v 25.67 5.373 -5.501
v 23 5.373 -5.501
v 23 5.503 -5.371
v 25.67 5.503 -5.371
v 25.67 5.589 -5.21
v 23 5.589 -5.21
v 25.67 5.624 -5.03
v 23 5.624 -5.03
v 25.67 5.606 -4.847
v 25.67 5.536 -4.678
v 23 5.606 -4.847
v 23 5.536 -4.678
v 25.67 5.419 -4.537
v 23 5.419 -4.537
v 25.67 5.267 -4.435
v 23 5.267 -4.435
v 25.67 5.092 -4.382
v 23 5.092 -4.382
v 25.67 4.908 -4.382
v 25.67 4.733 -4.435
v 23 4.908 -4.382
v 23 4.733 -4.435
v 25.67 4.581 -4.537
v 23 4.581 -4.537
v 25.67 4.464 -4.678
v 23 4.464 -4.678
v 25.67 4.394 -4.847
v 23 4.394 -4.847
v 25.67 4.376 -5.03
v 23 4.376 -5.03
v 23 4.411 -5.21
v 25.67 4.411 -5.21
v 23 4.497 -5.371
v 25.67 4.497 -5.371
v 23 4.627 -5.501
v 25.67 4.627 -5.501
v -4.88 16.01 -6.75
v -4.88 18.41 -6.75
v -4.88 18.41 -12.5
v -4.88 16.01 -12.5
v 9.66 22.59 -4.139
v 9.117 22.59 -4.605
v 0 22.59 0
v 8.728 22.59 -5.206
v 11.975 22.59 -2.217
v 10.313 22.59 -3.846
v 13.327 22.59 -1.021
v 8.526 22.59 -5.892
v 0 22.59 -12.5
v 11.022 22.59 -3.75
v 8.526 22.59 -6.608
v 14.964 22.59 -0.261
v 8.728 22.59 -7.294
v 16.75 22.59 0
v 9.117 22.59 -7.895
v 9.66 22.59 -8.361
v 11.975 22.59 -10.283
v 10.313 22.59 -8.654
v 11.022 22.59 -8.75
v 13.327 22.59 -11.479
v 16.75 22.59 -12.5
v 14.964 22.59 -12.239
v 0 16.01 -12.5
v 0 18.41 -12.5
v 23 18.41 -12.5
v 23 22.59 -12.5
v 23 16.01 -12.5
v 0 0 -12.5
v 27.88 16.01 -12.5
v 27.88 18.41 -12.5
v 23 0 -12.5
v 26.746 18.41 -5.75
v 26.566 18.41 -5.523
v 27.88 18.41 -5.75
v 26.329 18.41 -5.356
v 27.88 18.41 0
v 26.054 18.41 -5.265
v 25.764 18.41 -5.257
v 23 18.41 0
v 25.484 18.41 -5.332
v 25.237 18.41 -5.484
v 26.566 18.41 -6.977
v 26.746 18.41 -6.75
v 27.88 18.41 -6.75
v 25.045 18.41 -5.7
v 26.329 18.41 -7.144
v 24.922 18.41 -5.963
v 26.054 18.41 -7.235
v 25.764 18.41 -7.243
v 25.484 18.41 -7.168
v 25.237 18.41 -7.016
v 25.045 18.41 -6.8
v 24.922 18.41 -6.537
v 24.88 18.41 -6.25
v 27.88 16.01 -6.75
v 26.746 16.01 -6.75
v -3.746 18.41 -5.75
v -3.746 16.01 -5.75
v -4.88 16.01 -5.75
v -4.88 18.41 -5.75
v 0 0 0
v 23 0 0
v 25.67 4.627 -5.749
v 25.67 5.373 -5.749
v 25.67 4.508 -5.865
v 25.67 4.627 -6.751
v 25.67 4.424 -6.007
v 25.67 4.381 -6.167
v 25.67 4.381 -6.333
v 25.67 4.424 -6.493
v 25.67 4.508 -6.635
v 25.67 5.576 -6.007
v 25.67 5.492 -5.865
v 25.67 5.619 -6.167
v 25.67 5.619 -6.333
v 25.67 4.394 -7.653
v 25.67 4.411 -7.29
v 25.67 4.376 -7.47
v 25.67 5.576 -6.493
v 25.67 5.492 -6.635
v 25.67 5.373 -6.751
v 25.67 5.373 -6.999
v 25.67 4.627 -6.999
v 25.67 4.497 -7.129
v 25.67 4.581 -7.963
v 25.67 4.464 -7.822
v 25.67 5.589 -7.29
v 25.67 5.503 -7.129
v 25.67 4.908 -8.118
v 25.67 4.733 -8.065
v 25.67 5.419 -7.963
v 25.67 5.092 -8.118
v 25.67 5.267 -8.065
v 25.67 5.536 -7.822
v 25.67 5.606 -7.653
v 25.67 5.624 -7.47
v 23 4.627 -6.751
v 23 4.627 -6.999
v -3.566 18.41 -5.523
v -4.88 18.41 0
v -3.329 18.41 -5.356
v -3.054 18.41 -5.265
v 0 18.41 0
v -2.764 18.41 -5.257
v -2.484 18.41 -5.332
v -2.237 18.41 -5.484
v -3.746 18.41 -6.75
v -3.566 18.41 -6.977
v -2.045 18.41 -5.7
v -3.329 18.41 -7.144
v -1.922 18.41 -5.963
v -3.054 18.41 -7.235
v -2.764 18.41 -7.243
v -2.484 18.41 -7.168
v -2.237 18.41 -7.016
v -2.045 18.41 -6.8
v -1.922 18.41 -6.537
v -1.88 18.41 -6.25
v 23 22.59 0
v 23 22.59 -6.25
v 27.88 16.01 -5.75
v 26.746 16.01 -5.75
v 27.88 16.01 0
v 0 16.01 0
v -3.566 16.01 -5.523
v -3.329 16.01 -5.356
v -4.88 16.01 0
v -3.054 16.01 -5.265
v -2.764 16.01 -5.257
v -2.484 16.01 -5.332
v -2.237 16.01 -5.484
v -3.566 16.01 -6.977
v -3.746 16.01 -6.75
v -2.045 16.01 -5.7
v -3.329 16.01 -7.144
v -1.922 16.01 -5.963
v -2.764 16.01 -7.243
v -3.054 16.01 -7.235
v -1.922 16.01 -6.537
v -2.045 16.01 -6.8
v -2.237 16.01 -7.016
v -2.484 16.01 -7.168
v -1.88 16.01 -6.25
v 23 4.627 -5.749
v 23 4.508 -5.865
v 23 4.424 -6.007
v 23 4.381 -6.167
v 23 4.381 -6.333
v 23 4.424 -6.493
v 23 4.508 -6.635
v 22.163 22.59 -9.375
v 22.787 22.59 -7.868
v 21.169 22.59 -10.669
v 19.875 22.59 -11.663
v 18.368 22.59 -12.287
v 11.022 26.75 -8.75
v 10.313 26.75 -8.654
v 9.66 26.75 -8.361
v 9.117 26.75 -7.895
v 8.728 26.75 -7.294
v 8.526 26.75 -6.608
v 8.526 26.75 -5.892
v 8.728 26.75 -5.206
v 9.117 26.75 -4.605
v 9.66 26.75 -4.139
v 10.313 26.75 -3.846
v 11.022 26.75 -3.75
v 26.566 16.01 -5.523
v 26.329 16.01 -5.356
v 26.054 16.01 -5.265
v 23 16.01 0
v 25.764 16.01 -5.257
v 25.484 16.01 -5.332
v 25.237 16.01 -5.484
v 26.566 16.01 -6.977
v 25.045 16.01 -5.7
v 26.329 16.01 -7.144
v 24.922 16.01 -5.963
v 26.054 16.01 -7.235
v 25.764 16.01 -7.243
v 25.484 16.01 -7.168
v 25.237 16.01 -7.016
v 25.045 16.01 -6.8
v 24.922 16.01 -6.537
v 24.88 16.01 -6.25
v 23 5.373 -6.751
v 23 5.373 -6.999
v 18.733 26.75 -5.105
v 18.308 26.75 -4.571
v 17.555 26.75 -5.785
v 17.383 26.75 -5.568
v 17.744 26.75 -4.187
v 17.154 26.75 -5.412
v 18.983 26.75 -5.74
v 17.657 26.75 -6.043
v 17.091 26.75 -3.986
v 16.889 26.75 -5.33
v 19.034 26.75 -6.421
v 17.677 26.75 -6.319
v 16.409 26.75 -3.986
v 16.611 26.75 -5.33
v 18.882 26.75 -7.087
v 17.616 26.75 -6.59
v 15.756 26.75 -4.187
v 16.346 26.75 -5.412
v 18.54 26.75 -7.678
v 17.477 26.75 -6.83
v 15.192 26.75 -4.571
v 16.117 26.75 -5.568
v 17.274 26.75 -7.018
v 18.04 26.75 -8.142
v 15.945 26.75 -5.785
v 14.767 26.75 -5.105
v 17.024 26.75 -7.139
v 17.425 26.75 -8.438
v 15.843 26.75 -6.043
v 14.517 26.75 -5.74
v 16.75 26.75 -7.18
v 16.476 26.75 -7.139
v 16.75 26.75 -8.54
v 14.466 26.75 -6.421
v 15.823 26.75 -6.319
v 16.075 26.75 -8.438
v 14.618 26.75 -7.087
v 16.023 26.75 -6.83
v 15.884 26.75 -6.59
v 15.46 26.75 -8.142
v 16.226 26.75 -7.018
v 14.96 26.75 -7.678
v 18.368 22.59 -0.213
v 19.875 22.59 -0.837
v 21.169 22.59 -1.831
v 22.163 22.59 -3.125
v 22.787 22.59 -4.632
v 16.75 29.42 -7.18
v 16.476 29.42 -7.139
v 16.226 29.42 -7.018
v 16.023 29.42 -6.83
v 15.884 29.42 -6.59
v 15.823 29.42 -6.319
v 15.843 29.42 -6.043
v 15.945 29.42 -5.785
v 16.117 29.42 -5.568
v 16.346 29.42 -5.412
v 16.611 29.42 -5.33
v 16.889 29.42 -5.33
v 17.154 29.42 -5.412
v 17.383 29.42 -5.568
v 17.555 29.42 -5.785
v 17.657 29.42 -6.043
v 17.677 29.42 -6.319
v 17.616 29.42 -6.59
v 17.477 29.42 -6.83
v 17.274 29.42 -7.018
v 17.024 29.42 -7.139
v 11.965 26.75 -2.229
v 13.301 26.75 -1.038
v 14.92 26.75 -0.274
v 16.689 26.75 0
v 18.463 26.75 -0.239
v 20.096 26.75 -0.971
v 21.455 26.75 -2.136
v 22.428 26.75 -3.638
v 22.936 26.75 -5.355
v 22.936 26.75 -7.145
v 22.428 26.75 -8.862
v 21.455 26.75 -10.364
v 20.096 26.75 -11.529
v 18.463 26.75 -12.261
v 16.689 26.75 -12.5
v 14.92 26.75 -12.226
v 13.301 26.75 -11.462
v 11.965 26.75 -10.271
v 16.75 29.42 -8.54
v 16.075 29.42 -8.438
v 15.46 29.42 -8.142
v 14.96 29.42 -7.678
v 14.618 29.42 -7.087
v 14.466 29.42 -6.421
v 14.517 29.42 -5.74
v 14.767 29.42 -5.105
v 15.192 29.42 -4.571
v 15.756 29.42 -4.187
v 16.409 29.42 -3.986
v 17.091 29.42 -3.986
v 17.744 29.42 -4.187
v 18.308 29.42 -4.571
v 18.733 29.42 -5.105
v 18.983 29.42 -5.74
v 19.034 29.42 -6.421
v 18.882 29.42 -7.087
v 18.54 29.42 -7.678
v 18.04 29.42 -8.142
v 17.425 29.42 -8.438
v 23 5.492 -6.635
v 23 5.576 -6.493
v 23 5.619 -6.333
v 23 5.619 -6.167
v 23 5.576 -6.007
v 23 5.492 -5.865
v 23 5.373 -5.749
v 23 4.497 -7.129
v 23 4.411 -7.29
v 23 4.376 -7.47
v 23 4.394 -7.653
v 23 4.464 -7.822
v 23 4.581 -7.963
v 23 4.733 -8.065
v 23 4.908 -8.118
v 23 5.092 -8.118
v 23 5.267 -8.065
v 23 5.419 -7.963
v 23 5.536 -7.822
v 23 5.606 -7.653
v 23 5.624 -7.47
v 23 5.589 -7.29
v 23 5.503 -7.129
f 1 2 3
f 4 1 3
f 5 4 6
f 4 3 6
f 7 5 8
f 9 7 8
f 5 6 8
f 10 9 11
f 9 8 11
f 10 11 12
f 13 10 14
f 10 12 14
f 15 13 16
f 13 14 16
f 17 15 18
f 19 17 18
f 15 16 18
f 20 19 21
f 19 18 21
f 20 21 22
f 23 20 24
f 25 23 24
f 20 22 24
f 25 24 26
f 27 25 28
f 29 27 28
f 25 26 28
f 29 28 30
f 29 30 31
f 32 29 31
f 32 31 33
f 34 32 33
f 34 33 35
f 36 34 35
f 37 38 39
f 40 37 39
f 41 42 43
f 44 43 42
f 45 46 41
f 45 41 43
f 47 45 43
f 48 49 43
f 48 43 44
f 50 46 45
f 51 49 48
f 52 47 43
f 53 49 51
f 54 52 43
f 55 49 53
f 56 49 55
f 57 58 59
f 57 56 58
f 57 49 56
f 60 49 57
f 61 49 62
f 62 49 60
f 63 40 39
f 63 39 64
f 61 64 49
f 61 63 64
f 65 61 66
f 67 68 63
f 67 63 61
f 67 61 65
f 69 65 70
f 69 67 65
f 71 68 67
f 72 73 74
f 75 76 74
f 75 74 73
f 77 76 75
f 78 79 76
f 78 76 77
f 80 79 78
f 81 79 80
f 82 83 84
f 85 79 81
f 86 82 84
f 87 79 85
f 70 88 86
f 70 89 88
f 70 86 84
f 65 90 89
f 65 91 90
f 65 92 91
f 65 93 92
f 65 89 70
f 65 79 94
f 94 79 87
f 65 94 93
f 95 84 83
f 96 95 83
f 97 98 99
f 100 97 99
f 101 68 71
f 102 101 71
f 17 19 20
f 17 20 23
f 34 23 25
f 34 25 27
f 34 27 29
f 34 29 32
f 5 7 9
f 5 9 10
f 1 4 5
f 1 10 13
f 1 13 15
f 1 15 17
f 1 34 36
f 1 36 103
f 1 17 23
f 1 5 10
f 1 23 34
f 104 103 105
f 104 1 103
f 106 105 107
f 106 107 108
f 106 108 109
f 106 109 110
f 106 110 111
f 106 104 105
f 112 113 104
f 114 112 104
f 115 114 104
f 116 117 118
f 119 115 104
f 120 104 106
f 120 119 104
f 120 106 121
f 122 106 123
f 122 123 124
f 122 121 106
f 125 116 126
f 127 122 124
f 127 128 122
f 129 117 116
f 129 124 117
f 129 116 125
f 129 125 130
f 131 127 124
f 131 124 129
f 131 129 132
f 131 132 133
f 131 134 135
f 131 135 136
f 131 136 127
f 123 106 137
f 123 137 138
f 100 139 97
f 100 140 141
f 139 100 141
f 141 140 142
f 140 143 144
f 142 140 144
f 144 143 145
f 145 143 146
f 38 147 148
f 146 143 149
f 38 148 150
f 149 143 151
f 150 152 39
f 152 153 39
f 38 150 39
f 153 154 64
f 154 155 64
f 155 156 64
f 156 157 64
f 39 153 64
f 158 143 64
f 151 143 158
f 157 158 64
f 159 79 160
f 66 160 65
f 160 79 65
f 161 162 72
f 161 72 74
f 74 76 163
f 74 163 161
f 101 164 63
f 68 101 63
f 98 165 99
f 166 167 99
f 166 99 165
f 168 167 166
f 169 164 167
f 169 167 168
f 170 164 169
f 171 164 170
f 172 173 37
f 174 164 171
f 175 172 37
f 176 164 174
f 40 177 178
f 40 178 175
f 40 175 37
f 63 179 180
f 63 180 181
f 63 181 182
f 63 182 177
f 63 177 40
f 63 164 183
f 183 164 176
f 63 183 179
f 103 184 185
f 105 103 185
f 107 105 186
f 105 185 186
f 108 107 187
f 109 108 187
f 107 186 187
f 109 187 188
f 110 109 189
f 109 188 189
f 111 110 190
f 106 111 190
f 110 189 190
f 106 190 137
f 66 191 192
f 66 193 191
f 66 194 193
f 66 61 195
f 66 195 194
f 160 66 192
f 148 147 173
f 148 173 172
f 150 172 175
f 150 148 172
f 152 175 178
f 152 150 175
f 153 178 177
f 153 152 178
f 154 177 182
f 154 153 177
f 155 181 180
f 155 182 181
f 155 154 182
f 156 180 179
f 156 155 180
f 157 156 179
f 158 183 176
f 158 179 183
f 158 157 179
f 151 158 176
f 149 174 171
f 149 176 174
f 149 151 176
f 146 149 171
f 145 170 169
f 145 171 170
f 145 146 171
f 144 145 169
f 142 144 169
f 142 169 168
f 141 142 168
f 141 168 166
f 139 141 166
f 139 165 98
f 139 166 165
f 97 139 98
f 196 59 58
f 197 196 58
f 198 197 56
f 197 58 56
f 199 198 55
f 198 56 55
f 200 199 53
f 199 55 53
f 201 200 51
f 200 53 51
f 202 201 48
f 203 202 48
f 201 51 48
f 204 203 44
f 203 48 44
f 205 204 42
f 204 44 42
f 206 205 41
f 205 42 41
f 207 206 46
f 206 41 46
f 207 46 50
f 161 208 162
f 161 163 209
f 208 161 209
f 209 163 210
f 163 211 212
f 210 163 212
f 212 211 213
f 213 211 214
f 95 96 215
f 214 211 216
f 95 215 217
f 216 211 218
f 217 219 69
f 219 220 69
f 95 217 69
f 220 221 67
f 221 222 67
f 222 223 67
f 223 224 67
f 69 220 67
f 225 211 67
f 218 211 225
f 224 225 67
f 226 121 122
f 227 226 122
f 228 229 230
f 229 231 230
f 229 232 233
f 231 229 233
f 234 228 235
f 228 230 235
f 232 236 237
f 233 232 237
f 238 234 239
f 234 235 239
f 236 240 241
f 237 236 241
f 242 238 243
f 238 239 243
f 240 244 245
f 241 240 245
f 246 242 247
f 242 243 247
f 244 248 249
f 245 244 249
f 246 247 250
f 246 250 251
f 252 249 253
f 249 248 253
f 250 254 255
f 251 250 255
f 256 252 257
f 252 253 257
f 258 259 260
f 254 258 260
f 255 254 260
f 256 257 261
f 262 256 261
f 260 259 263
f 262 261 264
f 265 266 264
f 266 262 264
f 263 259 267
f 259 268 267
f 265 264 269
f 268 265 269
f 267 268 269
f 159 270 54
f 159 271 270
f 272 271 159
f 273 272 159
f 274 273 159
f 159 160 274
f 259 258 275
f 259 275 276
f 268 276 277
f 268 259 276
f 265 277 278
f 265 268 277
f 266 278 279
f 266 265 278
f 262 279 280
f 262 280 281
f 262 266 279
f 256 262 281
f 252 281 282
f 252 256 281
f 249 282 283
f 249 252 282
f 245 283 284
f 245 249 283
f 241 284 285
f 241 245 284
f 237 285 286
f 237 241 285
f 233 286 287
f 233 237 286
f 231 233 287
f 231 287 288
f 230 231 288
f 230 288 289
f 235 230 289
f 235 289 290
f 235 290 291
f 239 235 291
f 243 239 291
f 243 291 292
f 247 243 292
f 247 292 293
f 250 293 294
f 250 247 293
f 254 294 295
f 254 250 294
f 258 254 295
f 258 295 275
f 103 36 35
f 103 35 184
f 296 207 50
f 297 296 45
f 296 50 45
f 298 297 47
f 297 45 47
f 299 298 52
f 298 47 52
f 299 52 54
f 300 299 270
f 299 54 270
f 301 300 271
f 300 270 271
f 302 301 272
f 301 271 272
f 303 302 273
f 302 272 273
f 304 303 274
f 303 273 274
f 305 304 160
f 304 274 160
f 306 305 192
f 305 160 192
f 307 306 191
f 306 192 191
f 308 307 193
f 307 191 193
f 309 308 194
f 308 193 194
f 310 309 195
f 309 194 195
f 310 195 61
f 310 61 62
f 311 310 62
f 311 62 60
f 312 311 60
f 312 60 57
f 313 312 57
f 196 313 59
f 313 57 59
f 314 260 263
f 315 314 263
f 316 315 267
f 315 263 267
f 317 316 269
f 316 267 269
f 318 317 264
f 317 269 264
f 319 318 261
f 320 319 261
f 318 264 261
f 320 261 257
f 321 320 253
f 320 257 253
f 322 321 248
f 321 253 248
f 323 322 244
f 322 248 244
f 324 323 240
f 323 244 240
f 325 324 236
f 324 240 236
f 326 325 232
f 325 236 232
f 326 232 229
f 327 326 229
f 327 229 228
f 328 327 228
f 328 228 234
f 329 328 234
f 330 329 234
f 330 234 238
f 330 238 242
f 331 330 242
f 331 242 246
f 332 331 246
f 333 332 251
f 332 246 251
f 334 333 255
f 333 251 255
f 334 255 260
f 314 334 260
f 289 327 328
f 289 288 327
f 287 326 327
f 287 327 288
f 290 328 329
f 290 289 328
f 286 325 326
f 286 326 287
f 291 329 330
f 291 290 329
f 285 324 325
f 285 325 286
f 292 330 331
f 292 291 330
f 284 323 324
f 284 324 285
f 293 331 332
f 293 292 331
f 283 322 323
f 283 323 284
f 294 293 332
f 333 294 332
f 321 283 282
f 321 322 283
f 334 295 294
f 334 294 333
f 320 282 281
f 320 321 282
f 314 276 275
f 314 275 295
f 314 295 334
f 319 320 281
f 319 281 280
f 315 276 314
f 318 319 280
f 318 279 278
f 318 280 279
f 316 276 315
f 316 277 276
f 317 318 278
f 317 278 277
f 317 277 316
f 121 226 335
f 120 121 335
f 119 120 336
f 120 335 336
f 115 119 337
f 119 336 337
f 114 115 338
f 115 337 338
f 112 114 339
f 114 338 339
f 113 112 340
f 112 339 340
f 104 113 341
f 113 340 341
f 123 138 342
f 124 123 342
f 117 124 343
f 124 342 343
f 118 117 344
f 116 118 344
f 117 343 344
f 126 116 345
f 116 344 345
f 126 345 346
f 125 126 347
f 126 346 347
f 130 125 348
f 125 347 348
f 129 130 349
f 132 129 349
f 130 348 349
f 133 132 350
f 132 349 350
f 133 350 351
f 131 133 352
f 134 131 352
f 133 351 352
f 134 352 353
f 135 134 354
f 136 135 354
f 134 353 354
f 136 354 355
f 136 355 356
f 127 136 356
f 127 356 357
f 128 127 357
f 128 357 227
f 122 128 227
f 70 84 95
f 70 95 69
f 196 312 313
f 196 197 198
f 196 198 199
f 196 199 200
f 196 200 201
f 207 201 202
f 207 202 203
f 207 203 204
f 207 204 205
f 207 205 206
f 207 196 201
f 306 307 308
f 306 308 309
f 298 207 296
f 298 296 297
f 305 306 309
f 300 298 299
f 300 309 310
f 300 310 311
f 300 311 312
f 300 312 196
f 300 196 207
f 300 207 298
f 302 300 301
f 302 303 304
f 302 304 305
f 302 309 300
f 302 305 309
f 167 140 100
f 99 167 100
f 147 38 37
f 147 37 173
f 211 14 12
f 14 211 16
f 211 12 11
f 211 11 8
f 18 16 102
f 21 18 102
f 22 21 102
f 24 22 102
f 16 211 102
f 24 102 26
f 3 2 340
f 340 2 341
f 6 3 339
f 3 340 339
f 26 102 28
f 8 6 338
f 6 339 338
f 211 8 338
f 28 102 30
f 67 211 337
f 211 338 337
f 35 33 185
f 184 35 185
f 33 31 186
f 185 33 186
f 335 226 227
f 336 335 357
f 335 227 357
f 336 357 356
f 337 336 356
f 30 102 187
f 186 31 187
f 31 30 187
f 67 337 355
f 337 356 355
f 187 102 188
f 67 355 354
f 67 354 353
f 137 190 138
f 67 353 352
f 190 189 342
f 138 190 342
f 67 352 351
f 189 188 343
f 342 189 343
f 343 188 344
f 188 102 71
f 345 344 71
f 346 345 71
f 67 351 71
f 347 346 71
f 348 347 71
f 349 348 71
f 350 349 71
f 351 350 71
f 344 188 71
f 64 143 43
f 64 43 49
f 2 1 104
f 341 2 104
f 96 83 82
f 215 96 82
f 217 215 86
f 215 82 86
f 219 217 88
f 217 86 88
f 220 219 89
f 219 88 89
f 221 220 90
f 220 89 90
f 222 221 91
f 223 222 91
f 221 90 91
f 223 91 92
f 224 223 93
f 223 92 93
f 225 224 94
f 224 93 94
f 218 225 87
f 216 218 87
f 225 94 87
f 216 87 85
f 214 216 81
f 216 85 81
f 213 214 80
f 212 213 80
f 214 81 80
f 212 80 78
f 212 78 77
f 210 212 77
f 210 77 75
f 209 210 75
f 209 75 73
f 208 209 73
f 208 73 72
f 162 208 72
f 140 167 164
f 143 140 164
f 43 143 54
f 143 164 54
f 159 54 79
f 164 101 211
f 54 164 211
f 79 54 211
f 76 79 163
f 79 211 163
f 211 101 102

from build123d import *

# Parameters (mm, degrees)
SKETCH1_W           = 23
SKETCH1_H           = 12.5
BOSS_EXTRUDE1_DEPTH = 22.59
SKETCH2_R           = 6.25
BOSS_EXTRUDE2_DEPTH = 4.16
SKETCH3_R           = 2.5
BOSS_EXTRUDE3_DEPTH = 4.16
SKETCH6_R           = 2.29
SKETCH6_R_2         = 0.93
BOSS_EXTRUDE5_DEPTH = 2.67
SKETCH4_W           = 12.5
SKETCH4_H           = 2.4
BOSS_EXTRUDE4_DEPTH = 4.88
CUT_EXTRUDE1_DEPTH  = 36.671732506
SKETCH7_R           = 0.625
SKETCH7_W           = 1.497675386
SKETCH7_H           = 0.746890466
BOSS_EXTRUDE7_DEPTH = 2.67


with BuildPart() as part:
    # Sketch1 → Boss-Extrude1 (new body)
    with BuildSketch(Plane(origin=(0, 0, 0), x_dir=(1, 0, 0), z_dir=(0, 1, 0))):
        with Locations((11.5, 6.25)):
            Rectangle(SKETCH1_W, SKETCH1_H)
    extrude(amount=BOSS_EXTRUDE1_DEPTH)

    # Sketch2 → Boss-Extrude2 (add)
    with BuildSketch(Plane(origin=(0, 22.59, 0), x_dir=(1, 0, 0), z_dir=(0, 1, 0))):
        with Locations(Location((16.75, 6.25, 0), (0, 0, 270))):
            Circle(SKETCH2_R)
    extrude(amount=BOSS_EXTRUDE2_DEPTH)

    # Sketch3 → Boss-Extrude3 (add)
    with BuildSketch(Plane(origin=(0, 22.59, 0), x_dir=(1, 0, 0), z_dir=(0, 1, 0))):
        with Locations((11, 6.25)):
            Circle(SKETCH3_R)
    extrude(amount=BOSS_EXTRUDE3_DEPTH)

    # Sketch4 → Boss-Extrude4 (add)
    with BuildSketch(Plane(origin=(23, 0, 0), x_dir=(0, 0, -1), z_dir=(1, 0, 0))):
        with Locations((6.25, 17.21)):
            Rectangle(SKETCH4_W, SKETCH4_H)
    boss_extrude4 = extrude(amount=BOSS_EXTRUDE4_DEPTH)

    # Sketch5 → Cut-Extrude1 (cut, through all)
    with BuildSketch(Plane(origin=(0, 18.41, 0), x_dir=(1, 0, 0), z_dir=(0, 1, 0))):
        with BuildLine():
            Line((25.88, 5.75), (25.88, 6.75))
            Line((25.88, 6.75), (26.746025404, 6.75))
            ThreePointArc((26.746025404, 6.75), (24.88, 6.25), (26.746025404, 5.75))
            Line((26.746025404, 5.75), (25.88, 5.75))
        make_face()
        with BuildLine():
            Line((26.746025404, 6.75), (25.88, 6.75))
            Line((25.88, 6.75), (25.88, 5.75))
            Line((25.88, 5.75), (26.746025404, 5.75))
            ThreePointArc((26.746025404, 5.75), (26.845925826, 5.991180955), (26.88, 6.25))
            ThreePointArc((26.88, 6.25), (26.845925826, 6.508819045), (26.746025404, 6.75))
        make_face()
        with BuildLine():
            Line((27.88, 6.75), (26.746025404, 6.75))
            ThreePointArc((26.746025404, 6.75), (26.845925826, 6.508819045), (26.88, 6.25))
            ThreePointArc((26.88, 6.25), (26.845925826, 5.991180955), (26.746025404, 5.75))
            Line((26.746025404, 5.75), (27.88, 5.75))
            Line((27.88, 5.75), (27.88, 6.75))
        make_face()
    cut_extrude1 = extrude(amount=-CUT_EXTRUDE1_DEPTH, mode=Mode.SUBTRACT)

    # Mirror1: Boss-Extrude4, Cut-Extrude1 across plane
    add(boss_extrude4.mirror(Plane(origin=(11.5, 0, 0), x_dir=(0, 0, 1), z_dir=(1, 0, 0))))
    add(cut_extrude1.mirror(Plane(origin=(11.5, 0, 0), x_dir=(0, 0, 1), z_dir=(1, 0, 0))), mode=Mode.SUBTRACT)

    # Sketch7 → Boss-Extrude7 (add)
    with BuildSketch(Plane(origin=(23, 0, 0), x_dir=(0, 0, -1), z_dir=(1, 0, 0))):
        with Locations((7.5, 5)):
            Circle(SKETCH7_R)
        with Locations((6.25, 5)):
            Circle(SKETCH7_R)
        with Locations((5, 5)):
            Circle(SKETCH7_R)
        with Locations((6.25, 5)):
            Rectangle(SKETCH7_W, SKETCH7_H)
    extrude(amount=BOSS_EXTRUDE7_DEPTH)


with BuildPart() as body_2:
    # Sketch6 → Boss-Extrude5 (new body)
    with BuildSketch(Plane(origin=(0, 26.75, 0), x_dir=(1, 0, 0), z_dir=(0, 1, 0))):
        with Locations(Location((16.75, 6.25, 0), (0, 0, 90))):
            Circle(SKETCH6_R)
        with Locations(Location((16.75, 6.25, 0), (0, 0, 90))):
            Circle(SKETCH6_R_2, mode=Mode.SUBTRACT)
    extrude(amount=BOSS_EXTRUDE5_DEPTH)


solid = Compound([part.part, body_2.part])
